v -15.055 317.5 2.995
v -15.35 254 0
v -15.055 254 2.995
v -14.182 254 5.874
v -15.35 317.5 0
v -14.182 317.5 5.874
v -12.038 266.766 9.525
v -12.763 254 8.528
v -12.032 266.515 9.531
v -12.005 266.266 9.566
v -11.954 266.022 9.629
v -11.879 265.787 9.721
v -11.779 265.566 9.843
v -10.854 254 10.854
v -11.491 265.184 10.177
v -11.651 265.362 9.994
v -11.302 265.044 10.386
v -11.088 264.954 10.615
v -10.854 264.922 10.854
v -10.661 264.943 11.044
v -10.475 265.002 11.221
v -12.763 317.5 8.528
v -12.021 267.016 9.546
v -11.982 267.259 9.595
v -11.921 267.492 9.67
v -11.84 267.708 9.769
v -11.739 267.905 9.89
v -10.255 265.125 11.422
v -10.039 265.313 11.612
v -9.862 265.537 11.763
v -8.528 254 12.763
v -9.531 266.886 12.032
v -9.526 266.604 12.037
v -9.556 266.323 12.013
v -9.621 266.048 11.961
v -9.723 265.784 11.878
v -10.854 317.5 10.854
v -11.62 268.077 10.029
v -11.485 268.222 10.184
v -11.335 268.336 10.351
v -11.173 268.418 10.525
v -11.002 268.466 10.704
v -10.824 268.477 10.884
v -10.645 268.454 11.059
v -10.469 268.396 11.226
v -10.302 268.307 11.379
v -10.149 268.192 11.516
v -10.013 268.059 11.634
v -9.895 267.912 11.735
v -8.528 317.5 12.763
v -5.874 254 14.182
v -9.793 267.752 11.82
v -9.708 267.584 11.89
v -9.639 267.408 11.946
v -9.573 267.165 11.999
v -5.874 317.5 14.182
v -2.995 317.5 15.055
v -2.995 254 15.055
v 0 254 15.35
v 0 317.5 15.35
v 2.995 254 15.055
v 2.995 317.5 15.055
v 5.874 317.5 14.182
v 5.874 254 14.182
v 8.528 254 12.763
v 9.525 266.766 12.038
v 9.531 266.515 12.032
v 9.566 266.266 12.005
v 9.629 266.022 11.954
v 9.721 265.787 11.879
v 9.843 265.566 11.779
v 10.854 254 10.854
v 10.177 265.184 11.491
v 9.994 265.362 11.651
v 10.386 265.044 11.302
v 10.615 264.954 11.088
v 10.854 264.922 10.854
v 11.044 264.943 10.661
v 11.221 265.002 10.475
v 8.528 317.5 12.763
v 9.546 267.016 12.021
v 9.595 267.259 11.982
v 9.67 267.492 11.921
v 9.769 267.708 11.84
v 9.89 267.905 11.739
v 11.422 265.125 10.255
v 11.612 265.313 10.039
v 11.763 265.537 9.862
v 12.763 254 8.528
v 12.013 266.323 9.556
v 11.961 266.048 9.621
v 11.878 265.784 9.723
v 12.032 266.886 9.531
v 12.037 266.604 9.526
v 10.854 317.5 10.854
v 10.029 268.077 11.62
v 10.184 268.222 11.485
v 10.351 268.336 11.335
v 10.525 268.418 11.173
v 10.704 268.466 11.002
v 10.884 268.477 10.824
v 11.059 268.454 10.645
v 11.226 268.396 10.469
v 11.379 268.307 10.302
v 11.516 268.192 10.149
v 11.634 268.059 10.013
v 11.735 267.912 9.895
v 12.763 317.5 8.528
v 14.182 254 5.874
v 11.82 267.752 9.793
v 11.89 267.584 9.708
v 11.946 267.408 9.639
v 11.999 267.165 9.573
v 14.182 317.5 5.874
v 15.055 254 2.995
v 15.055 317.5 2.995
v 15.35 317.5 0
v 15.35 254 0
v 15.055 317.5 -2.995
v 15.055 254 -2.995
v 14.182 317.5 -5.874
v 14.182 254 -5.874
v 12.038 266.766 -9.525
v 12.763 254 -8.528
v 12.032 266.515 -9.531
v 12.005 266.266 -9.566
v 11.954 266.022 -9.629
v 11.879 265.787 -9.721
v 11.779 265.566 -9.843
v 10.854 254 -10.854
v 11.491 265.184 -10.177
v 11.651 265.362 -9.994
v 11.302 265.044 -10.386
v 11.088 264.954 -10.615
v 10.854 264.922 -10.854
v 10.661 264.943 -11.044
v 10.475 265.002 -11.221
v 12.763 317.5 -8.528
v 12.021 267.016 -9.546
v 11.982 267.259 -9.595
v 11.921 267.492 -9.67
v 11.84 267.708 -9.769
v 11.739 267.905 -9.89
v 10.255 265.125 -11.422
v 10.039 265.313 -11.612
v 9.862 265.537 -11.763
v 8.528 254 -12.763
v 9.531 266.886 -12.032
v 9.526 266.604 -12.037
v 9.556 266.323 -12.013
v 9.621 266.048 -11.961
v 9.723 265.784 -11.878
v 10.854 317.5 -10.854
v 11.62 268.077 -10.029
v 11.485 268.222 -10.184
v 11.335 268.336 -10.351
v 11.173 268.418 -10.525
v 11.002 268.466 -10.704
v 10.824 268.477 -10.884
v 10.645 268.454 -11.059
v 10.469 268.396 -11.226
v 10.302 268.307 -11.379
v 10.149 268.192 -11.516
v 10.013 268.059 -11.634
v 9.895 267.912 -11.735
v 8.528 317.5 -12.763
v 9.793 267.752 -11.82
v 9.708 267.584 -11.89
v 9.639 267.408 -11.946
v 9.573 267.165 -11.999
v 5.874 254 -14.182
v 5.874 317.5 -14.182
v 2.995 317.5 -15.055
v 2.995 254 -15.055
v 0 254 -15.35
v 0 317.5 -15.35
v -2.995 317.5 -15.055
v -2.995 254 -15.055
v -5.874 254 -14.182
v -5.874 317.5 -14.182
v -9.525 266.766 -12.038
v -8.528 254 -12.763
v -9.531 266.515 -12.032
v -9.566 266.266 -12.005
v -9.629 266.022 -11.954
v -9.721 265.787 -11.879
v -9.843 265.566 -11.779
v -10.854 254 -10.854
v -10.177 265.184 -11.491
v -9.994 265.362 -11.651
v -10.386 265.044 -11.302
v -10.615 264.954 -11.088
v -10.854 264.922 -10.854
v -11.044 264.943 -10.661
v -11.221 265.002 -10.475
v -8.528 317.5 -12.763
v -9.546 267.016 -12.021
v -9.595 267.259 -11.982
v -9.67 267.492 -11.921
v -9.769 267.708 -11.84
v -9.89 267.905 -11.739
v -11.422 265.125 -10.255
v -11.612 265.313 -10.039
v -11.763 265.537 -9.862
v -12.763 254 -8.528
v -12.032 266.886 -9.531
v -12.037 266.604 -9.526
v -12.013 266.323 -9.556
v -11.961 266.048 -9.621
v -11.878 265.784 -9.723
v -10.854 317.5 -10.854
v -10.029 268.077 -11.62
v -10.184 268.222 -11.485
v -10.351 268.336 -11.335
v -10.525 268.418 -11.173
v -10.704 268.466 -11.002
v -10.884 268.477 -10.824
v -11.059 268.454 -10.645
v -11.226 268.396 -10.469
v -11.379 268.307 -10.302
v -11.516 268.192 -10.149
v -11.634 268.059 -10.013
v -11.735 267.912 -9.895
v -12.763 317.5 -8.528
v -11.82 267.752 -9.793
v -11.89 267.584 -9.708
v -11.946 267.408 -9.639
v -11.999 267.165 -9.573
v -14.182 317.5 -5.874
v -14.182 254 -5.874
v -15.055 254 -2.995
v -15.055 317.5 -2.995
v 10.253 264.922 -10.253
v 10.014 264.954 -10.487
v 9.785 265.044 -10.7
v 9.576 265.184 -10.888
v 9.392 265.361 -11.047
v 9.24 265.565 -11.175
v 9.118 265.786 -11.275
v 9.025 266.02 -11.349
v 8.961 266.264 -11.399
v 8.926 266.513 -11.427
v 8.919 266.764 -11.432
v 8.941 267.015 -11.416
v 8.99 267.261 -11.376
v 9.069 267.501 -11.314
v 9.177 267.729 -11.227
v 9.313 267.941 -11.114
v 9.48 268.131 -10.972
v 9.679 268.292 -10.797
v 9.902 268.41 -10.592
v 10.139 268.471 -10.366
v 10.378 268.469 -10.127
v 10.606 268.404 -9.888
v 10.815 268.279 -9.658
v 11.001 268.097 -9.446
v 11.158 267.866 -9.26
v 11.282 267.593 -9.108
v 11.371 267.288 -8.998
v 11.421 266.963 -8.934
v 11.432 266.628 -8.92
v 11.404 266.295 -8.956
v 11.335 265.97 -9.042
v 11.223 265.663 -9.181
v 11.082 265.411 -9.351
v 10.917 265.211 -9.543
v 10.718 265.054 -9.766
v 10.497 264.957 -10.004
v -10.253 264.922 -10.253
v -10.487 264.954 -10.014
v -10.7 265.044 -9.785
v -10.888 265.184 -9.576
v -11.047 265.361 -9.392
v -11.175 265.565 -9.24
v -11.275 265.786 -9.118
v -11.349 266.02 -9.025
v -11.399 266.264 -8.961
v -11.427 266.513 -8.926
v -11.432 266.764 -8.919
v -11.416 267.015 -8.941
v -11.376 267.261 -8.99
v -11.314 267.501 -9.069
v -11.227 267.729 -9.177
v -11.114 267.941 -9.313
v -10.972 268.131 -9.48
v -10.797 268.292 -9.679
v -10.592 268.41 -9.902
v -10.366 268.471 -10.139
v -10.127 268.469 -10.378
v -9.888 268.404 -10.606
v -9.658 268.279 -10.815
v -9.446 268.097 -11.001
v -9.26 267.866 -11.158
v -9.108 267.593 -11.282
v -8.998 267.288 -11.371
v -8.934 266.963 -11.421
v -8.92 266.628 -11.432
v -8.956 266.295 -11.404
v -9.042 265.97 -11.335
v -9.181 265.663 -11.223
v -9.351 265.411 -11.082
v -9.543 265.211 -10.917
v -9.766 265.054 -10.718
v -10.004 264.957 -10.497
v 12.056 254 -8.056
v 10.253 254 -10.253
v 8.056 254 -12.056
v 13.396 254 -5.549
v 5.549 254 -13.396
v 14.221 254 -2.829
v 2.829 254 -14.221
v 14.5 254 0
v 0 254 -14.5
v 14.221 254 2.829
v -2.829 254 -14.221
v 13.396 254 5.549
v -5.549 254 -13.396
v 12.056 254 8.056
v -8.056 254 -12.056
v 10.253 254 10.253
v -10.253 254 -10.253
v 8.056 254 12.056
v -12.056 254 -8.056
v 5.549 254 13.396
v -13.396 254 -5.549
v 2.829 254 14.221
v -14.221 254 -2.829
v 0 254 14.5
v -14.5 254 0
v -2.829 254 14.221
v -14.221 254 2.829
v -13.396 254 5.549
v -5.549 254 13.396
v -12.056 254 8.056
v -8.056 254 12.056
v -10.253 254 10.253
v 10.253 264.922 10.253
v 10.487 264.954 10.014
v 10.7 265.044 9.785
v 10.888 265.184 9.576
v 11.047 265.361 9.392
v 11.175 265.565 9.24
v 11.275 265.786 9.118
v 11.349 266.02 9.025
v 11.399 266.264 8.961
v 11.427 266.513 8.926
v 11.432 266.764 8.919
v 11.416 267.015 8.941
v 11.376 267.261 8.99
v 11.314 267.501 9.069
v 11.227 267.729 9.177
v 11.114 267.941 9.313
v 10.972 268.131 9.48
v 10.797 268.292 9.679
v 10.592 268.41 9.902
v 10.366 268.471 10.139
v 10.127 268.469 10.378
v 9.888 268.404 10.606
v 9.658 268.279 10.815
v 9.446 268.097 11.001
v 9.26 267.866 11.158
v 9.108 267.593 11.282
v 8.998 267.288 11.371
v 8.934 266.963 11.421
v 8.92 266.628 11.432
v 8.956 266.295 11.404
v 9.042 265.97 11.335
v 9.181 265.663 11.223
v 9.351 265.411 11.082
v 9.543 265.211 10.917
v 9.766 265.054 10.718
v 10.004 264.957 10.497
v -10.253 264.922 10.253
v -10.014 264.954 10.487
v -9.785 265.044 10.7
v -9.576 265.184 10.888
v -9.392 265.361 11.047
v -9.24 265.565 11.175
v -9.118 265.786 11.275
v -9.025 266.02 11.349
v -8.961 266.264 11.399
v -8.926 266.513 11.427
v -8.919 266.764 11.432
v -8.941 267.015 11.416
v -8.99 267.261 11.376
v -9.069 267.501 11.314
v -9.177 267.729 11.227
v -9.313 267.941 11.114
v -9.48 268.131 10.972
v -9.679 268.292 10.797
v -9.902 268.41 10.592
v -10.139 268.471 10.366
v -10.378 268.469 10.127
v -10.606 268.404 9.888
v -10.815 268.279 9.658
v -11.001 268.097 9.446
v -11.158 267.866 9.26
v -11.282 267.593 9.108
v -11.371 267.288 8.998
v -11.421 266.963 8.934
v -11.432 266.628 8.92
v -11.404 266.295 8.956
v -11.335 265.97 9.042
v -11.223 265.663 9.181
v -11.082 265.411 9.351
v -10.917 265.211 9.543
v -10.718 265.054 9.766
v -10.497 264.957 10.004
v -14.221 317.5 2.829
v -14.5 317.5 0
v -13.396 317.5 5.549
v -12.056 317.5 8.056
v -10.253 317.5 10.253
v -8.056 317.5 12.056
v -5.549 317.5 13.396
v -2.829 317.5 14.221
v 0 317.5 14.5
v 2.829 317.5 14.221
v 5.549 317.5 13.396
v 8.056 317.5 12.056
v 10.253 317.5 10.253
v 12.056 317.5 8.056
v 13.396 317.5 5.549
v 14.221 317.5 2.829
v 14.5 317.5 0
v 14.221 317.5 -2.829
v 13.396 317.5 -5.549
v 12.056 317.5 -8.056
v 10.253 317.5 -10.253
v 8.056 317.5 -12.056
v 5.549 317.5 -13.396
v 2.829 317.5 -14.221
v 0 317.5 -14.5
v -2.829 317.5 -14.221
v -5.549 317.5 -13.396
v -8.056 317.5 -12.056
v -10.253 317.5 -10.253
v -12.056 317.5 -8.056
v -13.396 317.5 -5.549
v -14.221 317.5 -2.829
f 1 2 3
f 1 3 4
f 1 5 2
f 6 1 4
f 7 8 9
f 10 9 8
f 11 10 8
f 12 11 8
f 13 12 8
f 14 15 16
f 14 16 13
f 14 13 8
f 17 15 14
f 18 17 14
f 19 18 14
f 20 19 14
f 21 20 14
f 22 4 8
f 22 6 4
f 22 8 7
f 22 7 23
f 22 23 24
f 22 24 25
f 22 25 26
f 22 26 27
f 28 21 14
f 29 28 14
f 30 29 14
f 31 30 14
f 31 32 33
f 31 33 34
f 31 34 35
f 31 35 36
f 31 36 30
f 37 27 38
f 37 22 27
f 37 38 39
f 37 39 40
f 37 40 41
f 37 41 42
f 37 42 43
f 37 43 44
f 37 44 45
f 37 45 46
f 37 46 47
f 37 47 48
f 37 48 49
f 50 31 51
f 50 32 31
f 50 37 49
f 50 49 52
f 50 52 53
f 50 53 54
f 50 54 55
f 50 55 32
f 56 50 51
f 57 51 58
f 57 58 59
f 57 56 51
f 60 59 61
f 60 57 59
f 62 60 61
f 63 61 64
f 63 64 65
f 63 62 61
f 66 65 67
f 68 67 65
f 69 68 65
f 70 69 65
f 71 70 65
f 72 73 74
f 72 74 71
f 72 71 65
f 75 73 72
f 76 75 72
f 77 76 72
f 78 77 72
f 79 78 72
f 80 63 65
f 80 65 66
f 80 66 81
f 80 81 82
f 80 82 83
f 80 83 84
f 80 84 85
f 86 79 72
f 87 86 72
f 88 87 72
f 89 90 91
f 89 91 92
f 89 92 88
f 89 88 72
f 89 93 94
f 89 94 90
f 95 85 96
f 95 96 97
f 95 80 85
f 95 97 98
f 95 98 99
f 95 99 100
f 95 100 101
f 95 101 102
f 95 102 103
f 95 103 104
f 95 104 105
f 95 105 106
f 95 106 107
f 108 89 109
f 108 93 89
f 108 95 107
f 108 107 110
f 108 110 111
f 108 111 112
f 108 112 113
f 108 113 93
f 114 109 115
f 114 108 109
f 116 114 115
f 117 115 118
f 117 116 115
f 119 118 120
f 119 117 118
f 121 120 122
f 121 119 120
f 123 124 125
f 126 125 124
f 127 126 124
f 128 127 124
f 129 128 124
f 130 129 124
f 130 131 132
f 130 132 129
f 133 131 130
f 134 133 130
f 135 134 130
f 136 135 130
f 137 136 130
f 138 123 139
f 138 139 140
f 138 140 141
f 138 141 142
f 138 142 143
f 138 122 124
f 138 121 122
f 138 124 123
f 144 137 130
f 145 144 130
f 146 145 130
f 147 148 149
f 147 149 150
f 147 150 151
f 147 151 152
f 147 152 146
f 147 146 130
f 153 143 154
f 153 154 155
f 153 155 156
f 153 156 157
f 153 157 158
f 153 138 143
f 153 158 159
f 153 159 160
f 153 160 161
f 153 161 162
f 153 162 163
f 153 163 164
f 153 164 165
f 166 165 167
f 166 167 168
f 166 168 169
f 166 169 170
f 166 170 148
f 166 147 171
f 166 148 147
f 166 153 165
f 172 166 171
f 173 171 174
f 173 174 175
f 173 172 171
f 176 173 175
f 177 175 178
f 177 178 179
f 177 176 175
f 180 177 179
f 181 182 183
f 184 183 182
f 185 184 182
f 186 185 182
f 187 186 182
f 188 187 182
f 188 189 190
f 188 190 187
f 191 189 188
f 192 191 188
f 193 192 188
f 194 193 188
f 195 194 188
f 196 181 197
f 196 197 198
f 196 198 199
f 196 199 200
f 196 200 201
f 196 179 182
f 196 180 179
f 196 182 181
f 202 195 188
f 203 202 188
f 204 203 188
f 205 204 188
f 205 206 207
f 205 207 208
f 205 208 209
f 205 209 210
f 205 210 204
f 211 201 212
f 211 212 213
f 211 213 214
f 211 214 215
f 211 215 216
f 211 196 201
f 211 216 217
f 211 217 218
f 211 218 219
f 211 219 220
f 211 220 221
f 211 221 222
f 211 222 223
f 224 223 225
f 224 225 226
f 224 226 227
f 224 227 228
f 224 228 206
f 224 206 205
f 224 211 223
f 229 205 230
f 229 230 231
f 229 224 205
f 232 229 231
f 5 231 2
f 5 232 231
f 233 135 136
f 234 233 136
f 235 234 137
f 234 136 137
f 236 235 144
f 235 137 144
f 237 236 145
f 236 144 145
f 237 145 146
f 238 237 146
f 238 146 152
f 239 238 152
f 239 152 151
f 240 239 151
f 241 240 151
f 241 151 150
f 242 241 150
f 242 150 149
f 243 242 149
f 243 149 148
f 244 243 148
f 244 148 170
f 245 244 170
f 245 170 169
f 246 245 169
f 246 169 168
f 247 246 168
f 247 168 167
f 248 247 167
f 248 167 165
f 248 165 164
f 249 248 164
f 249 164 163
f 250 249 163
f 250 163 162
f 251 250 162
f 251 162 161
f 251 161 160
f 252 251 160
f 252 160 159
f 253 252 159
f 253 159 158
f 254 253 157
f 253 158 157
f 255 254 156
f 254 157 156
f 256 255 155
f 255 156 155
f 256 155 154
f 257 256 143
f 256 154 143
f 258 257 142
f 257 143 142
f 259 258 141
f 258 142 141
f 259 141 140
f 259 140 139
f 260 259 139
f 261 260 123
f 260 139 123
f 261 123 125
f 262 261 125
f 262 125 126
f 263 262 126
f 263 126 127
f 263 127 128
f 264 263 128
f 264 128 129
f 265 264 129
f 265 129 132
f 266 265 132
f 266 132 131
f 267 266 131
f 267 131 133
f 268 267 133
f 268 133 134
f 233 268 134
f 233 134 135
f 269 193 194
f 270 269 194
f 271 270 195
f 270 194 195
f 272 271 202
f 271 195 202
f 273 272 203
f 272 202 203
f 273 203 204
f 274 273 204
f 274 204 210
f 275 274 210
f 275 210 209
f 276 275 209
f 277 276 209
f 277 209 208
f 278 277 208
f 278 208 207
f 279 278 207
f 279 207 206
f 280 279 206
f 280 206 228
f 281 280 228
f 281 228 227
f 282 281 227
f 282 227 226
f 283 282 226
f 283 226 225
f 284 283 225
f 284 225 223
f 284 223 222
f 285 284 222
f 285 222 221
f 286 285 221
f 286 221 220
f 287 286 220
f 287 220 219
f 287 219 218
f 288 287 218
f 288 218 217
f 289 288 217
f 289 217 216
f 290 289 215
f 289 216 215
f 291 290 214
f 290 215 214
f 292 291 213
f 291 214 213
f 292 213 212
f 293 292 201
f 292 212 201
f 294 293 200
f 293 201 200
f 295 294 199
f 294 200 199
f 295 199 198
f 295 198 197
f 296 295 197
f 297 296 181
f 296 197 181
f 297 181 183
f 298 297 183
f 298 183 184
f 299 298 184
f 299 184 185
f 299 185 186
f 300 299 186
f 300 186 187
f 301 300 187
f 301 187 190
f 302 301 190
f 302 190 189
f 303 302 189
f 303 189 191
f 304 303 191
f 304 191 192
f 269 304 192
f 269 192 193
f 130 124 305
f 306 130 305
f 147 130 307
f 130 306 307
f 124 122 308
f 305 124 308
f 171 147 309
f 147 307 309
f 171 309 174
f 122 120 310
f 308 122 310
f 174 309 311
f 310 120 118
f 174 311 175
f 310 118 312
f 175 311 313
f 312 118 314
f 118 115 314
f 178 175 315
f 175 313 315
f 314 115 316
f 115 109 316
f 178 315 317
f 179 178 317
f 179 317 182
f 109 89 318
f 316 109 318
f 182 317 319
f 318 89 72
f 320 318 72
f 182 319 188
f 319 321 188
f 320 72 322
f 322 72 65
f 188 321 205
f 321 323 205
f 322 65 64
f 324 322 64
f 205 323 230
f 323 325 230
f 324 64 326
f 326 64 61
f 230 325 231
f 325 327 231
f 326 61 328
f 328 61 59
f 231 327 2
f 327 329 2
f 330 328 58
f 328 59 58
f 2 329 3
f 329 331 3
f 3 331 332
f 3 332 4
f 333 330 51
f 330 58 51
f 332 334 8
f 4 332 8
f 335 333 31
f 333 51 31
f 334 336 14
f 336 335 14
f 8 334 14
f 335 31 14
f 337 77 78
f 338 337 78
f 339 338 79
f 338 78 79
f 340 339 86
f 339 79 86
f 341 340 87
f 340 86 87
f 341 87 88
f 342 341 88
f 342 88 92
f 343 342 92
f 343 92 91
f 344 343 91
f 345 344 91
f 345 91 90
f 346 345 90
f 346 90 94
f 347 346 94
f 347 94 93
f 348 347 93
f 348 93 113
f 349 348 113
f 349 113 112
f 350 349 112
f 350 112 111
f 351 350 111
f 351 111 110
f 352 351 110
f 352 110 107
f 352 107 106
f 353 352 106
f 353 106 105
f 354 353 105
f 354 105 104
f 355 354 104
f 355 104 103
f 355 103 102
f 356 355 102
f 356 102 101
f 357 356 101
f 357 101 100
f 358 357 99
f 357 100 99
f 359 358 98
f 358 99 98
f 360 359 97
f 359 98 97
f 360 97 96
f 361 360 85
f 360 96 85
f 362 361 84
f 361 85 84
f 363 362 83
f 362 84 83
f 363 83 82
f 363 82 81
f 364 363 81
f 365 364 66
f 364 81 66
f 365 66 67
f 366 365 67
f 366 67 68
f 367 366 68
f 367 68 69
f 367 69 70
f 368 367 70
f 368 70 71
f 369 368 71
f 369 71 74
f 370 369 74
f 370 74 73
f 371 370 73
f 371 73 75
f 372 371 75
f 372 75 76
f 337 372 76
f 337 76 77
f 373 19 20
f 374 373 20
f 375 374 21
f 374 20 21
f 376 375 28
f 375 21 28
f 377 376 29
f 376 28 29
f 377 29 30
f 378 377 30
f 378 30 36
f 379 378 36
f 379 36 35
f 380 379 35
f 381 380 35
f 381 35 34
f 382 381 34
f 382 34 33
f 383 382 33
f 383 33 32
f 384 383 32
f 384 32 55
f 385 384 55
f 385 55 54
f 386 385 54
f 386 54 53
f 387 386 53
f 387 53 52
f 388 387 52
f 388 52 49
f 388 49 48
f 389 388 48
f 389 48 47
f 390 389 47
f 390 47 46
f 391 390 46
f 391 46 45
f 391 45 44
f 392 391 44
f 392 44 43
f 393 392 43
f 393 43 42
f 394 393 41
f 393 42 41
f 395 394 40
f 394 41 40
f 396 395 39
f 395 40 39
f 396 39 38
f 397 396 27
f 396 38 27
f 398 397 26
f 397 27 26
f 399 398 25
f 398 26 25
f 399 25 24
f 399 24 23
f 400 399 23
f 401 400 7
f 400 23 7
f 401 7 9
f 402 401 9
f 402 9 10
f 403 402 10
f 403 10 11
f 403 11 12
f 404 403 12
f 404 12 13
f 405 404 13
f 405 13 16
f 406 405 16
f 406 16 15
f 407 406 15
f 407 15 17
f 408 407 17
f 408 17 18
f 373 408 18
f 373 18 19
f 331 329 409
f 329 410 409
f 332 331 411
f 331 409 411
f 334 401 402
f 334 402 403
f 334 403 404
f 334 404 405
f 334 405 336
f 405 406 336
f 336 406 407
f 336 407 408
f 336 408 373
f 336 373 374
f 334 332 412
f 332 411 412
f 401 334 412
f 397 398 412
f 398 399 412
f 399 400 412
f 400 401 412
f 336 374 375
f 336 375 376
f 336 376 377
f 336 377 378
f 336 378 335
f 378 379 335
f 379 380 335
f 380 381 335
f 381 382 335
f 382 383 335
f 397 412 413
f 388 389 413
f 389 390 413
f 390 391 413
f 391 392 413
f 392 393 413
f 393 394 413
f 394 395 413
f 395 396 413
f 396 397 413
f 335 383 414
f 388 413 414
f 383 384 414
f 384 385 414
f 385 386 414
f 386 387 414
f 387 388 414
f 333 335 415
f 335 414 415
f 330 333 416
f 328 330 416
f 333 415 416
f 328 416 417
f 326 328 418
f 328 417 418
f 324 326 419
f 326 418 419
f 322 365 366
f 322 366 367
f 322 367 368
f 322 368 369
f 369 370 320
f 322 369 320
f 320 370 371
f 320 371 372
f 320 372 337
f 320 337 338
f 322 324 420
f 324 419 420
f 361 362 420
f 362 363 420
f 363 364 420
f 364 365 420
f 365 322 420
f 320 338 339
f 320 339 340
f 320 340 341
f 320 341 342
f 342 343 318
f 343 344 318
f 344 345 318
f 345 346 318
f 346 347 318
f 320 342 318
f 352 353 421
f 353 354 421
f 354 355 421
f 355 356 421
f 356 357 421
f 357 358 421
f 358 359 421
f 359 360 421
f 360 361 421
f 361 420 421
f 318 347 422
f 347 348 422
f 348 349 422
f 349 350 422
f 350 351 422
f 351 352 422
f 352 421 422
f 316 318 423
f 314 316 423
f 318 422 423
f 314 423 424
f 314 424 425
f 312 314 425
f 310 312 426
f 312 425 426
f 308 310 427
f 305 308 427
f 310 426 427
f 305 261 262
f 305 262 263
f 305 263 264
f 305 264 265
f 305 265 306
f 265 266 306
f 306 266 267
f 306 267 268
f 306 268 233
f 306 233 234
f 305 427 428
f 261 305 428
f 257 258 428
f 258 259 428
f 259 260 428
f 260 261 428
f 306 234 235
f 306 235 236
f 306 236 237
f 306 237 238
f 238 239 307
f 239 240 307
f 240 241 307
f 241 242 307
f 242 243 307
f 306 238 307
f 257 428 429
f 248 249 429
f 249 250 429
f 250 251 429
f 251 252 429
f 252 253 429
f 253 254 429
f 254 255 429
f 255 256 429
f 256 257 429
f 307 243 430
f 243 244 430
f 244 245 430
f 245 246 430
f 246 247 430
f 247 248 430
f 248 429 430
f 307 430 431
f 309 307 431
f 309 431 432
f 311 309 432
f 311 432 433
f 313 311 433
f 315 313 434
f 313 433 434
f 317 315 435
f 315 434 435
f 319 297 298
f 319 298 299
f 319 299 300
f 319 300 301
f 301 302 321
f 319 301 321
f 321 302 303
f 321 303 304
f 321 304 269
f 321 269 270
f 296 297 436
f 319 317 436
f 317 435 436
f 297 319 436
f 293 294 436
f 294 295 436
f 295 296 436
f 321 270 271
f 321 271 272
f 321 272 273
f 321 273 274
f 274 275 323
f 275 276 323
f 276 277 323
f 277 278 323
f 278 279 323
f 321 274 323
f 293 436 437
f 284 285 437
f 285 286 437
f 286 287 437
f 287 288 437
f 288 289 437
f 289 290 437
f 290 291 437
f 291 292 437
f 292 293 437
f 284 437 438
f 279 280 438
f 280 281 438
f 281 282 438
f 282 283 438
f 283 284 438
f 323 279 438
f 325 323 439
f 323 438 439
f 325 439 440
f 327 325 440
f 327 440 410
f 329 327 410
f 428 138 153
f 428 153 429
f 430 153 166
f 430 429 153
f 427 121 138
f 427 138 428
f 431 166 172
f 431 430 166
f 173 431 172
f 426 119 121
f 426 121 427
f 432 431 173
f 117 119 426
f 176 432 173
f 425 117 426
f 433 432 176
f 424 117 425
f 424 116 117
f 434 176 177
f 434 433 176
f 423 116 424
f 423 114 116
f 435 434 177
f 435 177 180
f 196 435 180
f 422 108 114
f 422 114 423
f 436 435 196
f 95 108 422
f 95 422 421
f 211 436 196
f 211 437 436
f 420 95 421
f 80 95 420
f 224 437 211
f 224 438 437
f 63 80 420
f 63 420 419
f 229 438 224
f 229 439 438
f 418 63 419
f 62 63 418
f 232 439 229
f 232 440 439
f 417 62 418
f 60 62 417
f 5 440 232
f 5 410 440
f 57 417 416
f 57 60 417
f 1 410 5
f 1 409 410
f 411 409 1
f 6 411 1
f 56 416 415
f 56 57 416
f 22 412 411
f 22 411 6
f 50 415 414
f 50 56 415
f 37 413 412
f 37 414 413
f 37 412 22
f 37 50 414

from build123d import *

# Parameters (mm, degrees)
SKETCH1_W          = 0.85
SKETCH1_H          = 63.5
SKETCH2_R          = 1.778
CUT_EXTRUDE1_DEPTH = 2.54
CIRPATTERN1_COUNT  = 4


with BuildPart() as part:
    # Sketch1 → Revolve1 (revolve)
    with BuildSketch(Plane.XY):
        with Locations((-14.925, 285.75)):
            Rectangle(SKETCH1_W, SKETCH1_H)
    revolve(axis=Axis((0, 0, 0), (0, 1, 0)))

    # Sketch2 → Cut-Extrude1 (cut)
    with BuildSketch(Plane(origin=(-10.854089091, 0, 10.854089091), x_dir=(0, -1, 0), z_dir=(-0.707106781, 0, 0.707106781))):
        with Locations((-266.7, 0)):
            Circle(SKETCH2_R)
    cut_extrude1 = extrude(amount=-CUT_EXTRUDE1_DEPTH, mode=Mode.SUBTRACT)

    # CirPattern1: Cut-Extrude1 ×4 about axis
    cirpattern1_axis = Axis((0, 317.5, 0), (0, -1, 0))
    for i in range(1, CIRPATTERN1_COUNT):
        add(cut_extrude1.rotate(cirpattern1_axis, i * 360 / CIRPATTERN1_COUNT), mode=Mode.SUBTRACT)


solid = part.part
